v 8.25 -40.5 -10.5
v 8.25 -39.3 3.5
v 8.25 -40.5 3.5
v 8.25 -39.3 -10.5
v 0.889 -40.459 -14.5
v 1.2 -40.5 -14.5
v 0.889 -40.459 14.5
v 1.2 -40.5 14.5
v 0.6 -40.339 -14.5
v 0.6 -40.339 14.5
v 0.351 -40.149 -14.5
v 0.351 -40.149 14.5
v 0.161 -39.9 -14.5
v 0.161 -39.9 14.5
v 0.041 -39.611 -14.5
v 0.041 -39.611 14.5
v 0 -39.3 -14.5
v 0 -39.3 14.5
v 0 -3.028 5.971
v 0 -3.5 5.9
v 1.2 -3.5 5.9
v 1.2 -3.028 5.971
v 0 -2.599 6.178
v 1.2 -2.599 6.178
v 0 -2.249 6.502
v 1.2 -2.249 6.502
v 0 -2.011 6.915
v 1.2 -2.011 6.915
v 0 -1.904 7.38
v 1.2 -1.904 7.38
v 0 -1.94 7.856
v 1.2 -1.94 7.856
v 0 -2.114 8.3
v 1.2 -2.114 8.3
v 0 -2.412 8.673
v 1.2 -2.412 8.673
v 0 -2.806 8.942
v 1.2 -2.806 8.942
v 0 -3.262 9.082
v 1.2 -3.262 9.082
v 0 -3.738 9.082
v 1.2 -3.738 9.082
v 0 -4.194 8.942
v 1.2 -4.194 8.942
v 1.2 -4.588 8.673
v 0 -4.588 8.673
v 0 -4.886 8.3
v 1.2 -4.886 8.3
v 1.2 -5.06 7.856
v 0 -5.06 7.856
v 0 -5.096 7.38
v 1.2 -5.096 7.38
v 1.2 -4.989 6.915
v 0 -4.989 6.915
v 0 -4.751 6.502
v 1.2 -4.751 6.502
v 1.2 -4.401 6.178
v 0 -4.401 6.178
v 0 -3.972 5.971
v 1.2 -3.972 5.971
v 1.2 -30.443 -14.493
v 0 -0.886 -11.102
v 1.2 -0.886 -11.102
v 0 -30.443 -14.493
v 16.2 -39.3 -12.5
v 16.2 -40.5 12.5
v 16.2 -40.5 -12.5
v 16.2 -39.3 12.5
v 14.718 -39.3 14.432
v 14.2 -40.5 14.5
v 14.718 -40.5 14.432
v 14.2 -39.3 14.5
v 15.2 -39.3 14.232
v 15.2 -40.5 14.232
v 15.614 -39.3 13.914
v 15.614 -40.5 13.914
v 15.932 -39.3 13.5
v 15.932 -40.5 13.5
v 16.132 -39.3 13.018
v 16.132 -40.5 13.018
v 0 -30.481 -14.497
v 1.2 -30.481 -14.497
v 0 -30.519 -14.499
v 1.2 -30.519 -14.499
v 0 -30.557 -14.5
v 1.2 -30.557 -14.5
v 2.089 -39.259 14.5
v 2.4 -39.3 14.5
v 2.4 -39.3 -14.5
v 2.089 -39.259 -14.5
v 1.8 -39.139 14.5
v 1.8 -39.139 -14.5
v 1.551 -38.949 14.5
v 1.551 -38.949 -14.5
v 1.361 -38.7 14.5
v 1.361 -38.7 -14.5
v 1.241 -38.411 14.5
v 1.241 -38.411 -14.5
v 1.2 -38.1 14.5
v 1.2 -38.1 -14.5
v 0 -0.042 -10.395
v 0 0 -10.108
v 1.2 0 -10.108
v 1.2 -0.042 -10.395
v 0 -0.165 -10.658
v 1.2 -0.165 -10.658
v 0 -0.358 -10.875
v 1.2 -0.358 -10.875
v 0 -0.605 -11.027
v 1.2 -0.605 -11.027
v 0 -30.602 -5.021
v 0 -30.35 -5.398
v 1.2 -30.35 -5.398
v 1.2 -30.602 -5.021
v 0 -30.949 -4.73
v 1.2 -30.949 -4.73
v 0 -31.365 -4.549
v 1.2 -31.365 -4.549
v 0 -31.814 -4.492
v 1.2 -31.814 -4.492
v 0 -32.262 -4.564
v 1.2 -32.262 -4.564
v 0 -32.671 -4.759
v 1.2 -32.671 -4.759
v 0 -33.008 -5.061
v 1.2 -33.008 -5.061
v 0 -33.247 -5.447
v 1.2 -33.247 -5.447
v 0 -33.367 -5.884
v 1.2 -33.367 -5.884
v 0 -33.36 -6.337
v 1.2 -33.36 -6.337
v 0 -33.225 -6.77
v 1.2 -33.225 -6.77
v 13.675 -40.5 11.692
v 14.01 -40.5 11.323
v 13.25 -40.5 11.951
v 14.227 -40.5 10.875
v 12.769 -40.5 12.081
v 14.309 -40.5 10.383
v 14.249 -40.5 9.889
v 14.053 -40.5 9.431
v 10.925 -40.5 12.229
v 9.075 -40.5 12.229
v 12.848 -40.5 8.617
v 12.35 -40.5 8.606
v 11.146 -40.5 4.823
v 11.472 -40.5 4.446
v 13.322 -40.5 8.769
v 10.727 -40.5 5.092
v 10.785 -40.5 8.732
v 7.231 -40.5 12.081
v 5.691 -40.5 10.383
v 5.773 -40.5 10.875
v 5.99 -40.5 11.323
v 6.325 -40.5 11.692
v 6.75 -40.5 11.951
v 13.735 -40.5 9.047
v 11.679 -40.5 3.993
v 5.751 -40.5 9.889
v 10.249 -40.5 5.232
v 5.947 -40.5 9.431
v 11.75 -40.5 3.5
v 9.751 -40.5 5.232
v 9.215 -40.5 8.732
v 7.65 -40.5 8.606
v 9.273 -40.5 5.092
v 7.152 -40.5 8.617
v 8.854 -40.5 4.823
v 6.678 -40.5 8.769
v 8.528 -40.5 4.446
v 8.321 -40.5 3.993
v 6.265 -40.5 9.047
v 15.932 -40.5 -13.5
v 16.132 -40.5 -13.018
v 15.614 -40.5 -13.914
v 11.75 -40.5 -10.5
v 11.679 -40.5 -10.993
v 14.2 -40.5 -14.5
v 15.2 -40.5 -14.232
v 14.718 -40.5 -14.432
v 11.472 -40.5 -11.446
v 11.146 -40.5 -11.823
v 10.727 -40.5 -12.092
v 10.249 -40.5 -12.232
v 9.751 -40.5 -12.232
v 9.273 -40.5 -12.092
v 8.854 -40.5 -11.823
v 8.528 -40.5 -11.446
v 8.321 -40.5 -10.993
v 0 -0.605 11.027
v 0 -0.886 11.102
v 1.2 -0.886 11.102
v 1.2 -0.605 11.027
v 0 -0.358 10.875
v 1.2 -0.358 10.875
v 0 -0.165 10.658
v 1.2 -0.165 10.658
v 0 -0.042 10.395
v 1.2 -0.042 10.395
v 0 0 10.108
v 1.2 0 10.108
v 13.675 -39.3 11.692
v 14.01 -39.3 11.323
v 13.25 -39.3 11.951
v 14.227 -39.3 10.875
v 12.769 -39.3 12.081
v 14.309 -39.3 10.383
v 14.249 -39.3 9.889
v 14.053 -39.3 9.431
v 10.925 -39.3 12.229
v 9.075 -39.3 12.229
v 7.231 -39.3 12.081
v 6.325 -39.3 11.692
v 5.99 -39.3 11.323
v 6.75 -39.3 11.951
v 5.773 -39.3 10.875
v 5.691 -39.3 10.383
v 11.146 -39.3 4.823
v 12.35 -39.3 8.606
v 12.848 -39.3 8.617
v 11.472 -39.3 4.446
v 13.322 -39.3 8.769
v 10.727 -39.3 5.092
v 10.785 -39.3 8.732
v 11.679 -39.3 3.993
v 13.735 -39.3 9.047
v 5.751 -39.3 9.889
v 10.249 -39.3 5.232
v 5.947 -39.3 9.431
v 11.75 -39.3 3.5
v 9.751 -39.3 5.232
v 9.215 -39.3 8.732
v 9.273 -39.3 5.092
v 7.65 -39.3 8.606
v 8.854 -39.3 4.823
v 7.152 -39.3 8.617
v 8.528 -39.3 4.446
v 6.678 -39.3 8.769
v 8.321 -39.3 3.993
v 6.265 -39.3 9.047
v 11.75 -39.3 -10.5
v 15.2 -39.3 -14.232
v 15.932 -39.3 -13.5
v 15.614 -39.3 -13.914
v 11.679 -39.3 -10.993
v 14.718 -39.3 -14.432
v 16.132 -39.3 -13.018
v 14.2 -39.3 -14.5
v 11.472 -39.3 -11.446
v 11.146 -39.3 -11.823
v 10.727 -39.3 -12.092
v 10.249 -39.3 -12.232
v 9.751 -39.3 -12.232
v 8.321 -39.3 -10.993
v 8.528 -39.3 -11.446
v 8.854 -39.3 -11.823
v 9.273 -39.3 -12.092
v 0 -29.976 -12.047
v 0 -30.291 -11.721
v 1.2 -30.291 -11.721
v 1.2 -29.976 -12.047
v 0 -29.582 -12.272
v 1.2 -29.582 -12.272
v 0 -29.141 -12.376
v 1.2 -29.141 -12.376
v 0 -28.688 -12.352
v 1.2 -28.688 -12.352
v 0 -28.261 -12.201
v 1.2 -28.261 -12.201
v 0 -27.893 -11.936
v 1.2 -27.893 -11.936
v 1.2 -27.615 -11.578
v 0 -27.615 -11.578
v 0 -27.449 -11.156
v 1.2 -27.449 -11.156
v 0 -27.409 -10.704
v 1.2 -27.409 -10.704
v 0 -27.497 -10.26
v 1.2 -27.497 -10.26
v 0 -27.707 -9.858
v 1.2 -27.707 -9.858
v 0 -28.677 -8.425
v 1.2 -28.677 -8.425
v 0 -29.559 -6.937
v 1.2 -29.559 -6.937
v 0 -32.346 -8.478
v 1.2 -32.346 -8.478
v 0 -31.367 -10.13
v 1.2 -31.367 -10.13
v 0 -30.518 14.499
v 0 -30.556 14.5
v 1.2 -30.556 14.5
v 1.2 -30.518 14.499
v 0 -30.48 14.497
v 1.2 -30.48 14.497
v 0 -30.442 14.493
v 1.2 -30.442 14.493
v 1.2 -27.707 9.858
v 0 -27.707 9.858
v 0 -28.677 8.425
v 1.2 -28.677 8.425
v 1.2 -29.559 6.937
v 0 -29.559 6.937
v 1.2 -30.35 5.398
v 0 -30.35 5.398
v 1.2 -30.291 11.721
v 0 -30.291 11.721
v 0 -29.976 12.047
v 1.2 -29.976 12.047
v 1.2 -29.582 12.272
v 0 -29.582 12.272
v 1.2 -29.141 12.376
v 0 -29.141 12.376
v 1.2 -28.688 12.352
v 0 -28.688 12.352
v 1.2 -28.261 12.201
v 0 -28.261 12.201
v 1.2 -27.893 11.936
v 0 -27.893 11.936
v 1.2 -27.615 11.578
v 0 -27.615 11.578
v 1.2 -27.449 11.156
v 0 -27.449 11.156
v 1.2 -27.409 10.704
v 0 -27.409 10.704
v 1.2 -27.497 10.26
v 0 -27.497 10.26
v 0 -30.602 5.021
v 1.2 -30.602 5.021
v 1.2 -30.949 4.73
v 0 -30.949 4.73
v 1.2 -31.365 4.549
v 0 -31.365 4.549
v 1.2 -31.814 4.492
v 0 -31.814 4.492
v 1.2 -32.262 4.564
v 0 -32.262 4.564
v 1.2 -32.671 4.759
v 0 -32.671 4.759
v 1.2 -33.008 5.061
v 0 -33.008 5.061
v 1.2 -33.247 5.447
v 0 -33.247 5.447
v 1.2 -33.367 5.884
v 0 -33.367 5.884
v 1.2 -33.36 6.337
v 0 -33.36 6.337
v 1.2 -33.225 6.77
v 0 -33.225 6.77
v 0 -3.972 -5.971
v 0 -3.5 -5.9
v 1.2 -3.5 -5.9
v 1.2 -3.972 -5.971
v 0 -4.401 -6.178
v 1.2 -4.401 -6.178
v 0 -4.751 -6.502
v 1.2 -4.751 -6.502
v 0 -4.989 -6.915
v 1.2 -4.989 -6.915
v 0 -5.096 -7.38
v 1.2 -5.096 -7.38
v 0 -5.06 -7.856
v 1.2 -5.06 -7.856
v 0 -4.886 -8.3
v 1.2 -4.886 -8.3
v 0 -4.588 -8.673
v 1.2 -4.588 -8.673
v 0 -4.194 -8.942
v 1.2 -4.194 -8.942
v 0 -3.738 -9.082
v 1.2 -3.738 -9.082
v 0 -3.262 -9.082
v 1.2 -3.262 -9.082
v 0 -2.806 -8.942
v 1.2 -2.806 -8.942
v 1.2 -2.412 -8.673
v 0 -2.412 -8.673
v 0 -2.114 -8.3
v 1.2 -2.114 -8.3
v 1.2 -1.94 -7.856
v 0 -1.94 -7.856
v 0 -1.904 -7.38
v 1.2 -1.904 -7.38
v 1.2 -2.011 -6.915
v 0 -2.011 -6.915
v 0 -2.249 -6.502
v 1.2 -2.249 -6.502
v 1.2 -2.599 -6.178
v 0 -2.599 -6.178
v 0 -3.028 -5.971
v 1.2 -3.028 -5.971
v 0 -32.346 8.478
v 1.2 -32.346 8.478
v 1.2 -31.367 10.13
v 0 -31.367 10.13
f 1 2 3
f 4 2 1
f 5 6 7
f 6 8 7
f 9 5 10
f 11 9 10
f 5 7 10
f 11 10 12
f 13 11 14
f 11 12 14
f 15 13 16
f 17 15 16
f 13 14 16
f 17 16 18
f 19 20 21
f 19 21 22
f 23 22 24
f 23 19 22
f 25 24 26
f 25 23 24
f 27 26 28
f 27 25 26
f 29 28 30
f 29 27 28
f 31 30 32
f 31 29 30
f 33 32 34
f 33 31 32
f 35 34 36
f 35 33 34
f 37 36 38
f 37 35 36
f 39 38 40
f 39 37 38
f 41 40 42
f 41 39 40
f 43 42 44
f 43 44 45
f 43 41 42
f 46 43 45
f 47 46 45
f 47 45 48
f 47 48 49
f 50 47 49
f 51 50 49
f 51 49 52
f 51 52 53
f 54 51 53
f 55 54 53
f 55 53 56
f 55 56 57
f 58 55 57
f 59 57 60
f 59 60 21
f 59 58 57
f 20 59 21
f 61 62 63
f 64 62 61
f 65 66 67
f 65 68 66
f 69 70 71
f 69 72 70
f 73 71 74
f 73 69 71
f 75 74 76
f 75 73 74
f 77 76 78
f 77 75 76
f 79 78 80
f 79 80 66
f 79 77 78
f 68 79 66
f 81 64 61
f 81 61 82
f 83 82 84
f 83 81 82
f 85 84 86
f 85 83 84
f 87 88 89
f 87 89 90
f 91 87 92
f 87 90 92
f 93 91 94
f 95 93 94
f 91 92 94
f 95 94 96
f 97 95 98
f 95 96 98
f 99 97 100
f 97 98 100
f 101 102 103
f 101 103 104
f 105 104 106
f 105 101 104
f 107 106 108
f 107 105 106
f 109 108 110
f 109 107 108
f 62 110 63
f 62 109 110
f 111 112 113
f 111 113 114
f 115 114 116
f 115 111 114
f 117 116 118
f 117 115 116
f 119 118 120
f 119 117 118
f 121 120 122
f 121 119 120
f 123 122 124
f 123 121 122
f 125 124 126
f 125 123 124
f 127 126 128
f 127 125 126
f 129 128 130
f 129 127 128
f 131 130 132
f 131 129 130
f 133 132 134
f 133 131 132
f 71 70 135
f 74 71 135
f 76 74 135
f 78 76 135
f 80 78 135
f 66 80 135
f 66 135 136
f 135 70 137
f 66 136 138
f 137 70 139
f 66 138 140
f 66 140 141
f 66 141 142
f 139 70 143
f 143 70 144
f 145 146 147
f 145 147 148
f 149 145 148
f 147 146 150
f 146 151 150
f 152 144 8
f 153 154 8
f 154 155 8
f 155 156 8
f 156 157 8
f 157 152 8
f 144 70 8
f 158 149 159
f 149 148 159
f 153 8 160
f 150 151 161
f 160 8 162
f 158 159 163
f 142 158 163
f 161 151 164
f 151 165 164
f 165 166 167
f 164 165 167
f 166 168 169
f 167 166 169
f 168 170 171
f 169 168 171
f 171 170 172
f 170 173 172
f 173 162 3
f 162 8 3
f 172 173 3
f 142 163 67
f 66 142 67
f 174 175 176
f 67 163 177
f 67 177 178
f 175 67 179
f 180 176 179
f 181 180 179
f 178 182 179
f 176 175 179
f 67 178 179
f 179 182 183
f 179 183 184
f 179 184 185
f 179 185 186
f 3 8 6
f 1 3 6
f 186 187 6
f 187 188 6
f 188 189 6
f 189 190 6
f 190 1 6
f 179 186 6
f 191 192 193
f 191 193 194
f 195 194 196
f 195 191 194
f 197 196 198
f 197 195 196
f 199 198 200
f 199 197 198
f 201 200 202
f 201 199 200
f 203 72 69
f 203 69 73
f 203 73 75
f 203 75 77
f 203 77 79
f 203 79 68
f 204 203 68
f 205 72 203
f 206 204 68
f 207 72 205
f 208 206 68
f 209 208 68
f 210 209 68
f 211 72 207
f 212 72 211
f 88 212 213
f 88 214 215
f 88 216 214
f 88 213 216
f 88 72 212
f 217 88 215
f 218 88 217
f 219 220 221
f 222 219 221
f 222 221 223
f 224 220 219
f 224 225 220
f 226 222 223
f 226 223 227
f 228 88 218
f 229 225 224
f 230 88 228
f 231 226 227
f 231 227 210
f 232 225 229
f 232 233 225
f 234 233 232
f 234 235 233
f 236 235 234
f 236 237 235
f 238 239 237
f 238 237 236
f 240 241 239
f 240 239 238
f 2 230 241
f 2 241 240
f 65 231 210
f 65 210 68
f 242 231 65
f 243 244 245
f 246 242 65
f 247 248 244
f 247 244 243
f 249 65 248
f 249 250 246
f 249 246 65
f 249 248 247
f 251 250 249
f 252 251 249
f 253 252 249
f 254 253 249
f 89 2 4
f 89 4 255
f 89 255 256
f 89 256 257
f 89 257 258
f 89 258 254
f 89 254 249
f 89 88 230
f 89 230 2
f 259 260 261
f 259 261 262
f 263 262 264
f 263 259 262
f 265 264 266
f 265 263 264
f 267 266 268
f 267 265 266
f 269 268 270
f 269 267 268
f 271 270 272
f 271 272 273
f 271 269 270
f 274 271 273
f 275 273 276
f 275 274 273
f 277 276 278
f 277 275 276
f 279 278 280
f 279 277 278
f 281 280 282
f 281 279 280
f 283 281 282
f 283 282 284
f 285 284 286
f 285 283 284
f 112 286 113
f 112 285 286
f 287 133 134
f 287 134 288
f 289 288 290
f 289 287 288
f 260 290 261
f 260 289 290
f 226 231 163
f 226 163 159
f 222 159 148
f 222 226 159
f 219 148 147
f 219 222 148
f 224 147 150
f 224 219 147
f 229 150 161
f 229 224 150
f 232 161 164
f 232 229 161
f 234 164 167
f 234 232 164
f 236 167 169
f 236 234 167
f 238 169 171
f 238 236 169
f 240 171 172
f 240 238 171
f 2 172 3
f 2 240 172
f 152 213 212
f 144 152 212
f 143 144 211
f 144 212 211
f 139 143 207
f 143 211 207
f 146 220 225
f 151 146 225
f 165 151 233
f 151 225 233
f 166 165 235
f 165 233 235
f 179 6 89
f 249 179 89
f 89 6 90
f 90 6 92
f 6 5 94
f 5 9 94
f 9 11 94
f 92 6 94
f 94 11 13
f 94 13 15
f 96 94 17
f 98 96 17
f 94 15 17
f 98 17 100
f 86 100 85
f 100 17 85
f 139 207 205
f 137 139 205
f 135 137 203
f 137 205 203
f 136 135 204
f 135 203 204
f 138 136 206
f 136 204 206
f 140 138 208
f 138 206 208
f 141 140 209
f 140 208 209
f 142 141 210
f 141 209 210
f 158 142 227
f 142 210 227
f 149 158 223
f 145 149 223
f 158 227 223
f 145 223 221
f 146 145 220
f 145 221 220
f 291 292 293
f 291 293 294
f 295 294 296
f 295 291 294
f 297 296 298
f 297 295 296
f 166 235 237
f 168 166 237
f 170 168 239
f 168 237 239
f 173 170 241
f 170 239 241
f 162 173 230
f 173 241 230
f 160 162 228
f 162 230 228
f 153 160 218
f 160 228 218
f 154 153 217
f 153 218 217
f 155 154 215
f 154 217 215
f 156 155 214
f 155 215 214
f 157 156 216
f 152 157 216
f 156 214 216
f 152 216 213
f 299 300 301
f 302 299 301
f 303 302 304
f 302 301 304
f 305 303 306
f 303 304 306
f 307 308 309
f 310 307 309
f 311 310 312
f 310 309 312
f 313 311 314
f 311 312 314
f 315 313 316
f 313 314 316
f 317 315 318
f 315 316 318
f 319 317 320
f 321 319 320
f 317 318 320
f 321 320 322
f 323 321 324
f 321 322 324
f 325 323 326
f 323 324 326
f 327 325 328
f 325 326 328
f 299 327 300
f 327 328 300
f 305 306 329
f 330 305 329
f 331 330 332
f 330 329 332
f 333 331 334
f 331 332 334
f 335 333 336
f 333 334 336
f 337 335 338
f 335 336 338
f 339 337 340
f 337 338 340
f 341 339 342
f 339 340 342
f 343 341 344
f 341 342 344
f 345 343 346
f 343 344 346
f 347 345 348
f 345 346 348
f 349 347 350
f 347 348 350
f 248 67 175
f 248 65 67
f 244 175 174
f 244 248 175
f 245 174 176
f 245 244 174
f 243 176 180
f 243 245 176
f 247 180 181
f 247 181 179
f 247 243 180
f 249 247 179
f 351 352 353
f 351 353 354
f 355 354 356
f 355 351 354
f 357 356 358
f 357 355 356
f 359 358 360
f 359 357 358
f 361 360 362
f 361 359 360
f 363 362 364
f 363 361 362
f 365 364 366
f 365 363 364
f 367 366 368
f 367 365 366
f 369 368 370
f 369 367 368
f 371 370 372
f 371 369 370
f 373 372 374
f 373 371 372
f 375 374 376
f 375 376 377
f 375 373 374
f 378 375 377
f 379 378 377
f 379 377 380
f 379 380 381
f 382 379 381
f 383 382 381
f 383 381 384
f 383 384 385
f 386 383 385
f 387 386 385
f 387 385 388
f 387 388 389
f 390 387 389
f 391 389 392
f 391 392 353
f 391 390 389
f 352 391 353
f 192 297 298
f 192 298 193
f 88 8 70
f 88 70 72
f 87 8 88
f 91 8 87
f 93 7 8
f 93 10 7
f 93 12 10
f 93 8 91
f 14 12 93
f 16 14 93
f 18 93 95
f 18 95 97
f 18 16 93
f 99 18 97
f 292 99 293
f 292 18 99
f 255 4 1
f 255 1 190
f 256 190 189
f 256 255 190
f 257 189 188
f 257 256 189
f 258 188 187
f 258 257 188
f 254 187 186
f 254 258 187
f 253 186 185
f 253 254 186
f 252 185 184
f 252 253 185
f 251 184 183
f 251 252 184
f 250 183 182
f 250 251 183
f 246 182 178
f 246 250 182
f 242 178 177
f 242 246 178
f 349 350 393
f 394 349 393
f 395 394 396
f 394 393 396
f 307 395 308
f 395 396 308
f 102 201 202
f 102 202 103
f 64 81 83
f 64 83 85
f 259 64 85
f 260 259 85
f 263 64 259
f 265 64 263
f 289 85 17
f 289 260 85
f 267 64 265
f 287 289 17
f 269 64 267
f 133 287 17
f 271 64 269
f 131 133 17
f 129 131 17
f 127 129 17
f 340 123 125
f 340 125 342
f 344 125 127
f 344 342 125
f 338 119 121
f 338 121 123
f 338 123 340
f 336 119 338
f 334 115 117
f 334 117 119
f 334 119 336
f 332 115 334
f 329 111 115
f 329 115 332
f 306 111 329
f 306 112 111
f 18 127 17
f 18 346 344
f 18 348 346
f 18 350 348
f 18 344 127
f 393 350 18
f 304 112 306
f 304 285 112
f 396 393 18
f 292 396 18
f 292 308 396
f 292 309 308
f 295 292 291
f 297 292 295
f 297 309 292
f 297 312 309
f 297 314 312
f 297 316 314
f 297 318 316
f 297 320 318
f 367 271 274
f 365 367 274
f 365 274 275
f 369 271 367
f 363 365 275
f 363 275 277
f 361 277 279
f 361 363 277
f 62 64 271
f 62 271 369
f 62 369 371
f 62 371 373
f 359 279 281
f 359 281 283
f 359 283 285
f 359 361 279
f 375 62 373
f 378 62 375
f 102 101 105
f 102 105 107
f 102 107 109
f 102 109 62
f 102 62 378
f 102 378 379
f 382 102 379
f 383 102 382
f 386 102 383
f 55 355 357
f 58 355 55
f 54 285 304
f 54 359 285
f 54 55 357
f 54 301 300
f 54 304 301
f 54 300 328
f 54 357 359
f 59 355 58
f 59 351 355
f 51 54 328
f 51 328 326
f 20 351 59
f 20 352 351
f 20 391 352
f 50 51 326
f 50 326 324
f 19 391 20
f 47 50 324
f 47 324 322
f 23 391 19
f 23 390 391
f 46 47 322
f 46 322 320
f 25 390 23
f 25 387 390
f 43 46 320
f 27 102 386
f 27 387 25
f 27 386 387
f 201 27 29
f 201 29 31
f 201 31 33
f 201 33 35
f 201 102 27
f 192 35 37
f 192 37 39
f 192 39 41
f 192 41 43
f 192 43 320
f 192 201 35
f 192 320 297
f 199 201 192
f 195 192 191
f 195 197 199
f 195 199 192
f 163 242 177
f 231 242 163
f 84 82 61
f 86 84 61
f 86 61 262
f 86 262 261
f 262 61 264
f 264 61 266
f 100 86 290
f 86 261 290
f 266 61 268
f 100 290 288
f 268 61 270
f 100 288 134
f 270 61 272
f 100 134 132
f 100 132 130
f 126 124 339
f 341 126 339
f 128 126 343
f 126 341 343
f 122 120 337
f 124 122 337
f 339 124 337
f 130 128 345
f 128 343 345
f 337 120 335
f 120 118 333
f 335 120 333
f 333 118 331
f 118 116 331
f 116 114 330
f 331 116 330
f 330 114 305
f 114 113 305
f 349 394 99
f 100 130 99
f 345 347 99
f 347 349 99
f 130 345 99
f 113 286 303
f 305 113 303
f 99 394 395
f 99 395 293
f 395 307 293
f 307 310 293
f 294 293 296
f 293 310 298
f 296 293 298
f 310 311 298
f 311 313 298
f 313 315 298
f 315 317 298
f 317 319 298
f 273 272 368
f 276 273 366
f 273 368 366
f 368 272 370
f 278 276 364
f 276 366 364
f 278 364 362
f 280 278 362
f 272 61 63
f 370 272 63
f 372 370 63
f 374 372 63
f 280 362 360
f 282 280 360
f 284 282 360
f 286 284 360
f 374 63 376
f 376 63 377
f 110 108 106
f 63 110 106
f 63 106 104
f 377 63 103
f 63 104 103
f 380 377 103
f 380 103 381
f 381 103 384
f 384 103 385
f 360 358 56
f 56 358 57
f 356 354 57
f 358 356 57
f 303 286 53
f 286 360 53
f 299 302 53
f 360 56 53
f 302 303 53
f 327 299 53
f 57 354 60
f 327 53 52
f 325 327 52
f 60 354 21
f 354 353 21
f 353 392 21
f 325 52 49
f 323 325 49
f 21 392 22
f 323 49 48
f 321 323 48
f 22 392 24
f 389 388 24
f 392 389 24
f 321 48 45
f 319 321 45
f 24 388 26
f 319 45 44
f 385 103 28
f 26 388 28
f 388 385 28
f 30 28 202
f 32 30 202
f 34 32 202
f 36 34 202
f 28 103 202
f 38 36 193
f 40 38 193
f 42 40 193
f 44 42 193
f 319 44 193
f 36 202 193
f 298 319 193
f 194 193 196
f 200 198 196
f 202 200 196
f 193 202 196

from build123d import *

# Parameters (mm, degrees)
SKETCH1_R           = 1.6
BOSS_EXTRUDE1_DEPTH = 1.2
SKETCH2_W           = 29
SKETCH2_H           = 1.2
BOSS_EXTRUDE2_DEPTH = 15
CUT_EXTRUDE1_DEPTH  = 45.913027063
FILLET1_R           = 1.2
FILLET2_R           = 1.2
FILLET3_R           = 2


with BuildPart() as part:
    # Sketch1 → Boss-Extrude1 (new body)
    with BuildSketch(Plane(origin=(0, 0, 0), x_dir=(0, 0, -1), z_dir=(1, 0, 0))):
        with BuildLine():
            Line((-7.5, 0), (7.5, 0))
            Line((7.5, 0), (10.108191381, 0))
            ThreePointArc((10.108191381, 0), (10.773771613, -0.253673694), (11.101671453, -0.88599409))
            Line((11.101671453, -0.88599409), (14.493480072, -30.44318348))
            ThreePointArc((14.493480072, -30.44318348), (14.498368687, -30.500093294), (14.5, -30.55718939))
            Line((14.5, -30.55718939), (14.5, -40.5))
            Line((14.5, -40.5), (-14.5, -40.5))
            Line((-14.5, -40.5), (-14.5, -30.556102861))
            ThreePointArc((-14.5, -30.556102861), (-14.498368572, -30.499004746), (-14.493479611, -30.442092935))
            Line((-14.493479611, -30.442092935), (-11.101674621, -0.885990074))
            ThreePointArc((-11.101674621, -0.885990074), (-10.773773734, -0.253672349), (-10.10819501, 0))
            Line((-10.10819501, 0), (-7.5, 0))
        make_face()
        with Locations((-7.5, -3.5)):
            Circle(SKETCH1_R, mode=Mode.SUBTRACT)
        with Locations(Location((7.5, -3.5, 0), (0, 0, 180))):
            Circle(SKETCH1_R, mode=Mode.SUBTRACT)
        with BuildLine():
            ThreePointArc((6.769643375, -33.224825582), (9.311234852, -31.868958813), (11.721023336, -30.290674494))
            ThreePointArc((11.721023336, -30.290674494), (12.081311767, -28.067489873), (9.858127146, -27.707201442))
            ThreePointArc((9.858127146, -27.707201442), (7.687475006, -29.128864072), (5.398099397, -30.350180849))
            ThreePointArc((5.398099397, -30.350180849), (4.64654902, -32.473275205), (6.769643375, -33.224825582))
        make_face(mode=Mode.SUBTRACT)
        with BuildLine():
            ThreePointArc((-6.769643375, -33.224825582), (-9.311234852, -31.868958813), (-11.721023336, -30.290674494))
            ThreePointArc((-11.721023336, -30.290674494), (-12.081311767, -28.067489873), (-9.858127146, -27.707201442))
            ThreePointArc((-9.858127146, -27.707201442), (-7.687475006, -29.128864072), (-5.398099397, -30.350180849))
            ThreePointArc((-5.398099397, -30.350180849), (-4.64654902, -32.473275205), (-6.769643375, -33.224825582))
        make_face(mode=Mode.SUBTRACT)
    extrude(amount=BOSS_EXTRUDE1_DEPTH)

    # Sketch2 → Boss-Extrude2 (add)
    with BuildSketch(Plane(origin=(1.2, 0, 0), x_dir=(0, 0, -1), z_dir=(1, 0, 0))):
        with Locations((0, -39.9)):
            Rectangle(SKETCH2_W, SKETCH2_H)
    extrude(amount=BOSS_EXTRUDE2_DEPTH)

    # Sketch3 → Cut-Extrude1 (cut, through all)
    with BuildSketch(Plane(origin=(0, -39.3, 0), x_dir=(1, 0, 0), z_dir=(0, 1, 0))):
        with BuildLine():
            Line((8.25, -3.5), (8.25, 10.5))
            ThreePointArc((8.25, 10.5), (10, 12.25), (11.75, 10.5))
            Line((11.75, 10.5), (11.75, -3.5))
            ThreePointArc((11.75, -3.5), (10, -5.25), (8.25, -3.5))
        make_face()
        with BuildLine():
            ThreePointArc((7.23117506, -12.08087557), (10, -12.24726258), (12.76882494, -12.08087557))
            ThreePointArc((12.76882494, -12.08087557), (14.296662597, -10.133900456), (12.349687483, -8.606062799))
            ThreePointArc((12.349687483, -8.606062799), (10, -8.74726258), (7.650312517, -8.606062799))
            ThreePointArc((7.650312517, -8.606062799), (5.703337403, -10.133900456), (7.23117506, -12.08087557))
        make_face()
    extrude(amount=-CUT_EXTRUDE1_DEPTH, mode=Mode.SUBTRACT)

    # Fillet1
    fillet1_edges = [part.edges().sort_by_distance(p)[0] for p in [
        (1.2, -39.3, 0),
    ]]
    fillet(fillet1_edges, radius=FILLET1_R)

    # Fillet2
    fillet2_edges = [part.edges().sort_by_distance(p)[0] for p in [
        (0, -40.5, 0),
    ]]
    fillet(fillet2_edges, radius=FILLET2_R)

    # Fillet3
    fillet3_edges = [part.edges().sort_by_distance(p)[0] for p in [
        (16.2, -39.9, 14.5),
        (16.2, -39.9, -14.5),
    ]]
    fillet(fillet3_edges, radius=FILLET3_R)


solid = part.part
